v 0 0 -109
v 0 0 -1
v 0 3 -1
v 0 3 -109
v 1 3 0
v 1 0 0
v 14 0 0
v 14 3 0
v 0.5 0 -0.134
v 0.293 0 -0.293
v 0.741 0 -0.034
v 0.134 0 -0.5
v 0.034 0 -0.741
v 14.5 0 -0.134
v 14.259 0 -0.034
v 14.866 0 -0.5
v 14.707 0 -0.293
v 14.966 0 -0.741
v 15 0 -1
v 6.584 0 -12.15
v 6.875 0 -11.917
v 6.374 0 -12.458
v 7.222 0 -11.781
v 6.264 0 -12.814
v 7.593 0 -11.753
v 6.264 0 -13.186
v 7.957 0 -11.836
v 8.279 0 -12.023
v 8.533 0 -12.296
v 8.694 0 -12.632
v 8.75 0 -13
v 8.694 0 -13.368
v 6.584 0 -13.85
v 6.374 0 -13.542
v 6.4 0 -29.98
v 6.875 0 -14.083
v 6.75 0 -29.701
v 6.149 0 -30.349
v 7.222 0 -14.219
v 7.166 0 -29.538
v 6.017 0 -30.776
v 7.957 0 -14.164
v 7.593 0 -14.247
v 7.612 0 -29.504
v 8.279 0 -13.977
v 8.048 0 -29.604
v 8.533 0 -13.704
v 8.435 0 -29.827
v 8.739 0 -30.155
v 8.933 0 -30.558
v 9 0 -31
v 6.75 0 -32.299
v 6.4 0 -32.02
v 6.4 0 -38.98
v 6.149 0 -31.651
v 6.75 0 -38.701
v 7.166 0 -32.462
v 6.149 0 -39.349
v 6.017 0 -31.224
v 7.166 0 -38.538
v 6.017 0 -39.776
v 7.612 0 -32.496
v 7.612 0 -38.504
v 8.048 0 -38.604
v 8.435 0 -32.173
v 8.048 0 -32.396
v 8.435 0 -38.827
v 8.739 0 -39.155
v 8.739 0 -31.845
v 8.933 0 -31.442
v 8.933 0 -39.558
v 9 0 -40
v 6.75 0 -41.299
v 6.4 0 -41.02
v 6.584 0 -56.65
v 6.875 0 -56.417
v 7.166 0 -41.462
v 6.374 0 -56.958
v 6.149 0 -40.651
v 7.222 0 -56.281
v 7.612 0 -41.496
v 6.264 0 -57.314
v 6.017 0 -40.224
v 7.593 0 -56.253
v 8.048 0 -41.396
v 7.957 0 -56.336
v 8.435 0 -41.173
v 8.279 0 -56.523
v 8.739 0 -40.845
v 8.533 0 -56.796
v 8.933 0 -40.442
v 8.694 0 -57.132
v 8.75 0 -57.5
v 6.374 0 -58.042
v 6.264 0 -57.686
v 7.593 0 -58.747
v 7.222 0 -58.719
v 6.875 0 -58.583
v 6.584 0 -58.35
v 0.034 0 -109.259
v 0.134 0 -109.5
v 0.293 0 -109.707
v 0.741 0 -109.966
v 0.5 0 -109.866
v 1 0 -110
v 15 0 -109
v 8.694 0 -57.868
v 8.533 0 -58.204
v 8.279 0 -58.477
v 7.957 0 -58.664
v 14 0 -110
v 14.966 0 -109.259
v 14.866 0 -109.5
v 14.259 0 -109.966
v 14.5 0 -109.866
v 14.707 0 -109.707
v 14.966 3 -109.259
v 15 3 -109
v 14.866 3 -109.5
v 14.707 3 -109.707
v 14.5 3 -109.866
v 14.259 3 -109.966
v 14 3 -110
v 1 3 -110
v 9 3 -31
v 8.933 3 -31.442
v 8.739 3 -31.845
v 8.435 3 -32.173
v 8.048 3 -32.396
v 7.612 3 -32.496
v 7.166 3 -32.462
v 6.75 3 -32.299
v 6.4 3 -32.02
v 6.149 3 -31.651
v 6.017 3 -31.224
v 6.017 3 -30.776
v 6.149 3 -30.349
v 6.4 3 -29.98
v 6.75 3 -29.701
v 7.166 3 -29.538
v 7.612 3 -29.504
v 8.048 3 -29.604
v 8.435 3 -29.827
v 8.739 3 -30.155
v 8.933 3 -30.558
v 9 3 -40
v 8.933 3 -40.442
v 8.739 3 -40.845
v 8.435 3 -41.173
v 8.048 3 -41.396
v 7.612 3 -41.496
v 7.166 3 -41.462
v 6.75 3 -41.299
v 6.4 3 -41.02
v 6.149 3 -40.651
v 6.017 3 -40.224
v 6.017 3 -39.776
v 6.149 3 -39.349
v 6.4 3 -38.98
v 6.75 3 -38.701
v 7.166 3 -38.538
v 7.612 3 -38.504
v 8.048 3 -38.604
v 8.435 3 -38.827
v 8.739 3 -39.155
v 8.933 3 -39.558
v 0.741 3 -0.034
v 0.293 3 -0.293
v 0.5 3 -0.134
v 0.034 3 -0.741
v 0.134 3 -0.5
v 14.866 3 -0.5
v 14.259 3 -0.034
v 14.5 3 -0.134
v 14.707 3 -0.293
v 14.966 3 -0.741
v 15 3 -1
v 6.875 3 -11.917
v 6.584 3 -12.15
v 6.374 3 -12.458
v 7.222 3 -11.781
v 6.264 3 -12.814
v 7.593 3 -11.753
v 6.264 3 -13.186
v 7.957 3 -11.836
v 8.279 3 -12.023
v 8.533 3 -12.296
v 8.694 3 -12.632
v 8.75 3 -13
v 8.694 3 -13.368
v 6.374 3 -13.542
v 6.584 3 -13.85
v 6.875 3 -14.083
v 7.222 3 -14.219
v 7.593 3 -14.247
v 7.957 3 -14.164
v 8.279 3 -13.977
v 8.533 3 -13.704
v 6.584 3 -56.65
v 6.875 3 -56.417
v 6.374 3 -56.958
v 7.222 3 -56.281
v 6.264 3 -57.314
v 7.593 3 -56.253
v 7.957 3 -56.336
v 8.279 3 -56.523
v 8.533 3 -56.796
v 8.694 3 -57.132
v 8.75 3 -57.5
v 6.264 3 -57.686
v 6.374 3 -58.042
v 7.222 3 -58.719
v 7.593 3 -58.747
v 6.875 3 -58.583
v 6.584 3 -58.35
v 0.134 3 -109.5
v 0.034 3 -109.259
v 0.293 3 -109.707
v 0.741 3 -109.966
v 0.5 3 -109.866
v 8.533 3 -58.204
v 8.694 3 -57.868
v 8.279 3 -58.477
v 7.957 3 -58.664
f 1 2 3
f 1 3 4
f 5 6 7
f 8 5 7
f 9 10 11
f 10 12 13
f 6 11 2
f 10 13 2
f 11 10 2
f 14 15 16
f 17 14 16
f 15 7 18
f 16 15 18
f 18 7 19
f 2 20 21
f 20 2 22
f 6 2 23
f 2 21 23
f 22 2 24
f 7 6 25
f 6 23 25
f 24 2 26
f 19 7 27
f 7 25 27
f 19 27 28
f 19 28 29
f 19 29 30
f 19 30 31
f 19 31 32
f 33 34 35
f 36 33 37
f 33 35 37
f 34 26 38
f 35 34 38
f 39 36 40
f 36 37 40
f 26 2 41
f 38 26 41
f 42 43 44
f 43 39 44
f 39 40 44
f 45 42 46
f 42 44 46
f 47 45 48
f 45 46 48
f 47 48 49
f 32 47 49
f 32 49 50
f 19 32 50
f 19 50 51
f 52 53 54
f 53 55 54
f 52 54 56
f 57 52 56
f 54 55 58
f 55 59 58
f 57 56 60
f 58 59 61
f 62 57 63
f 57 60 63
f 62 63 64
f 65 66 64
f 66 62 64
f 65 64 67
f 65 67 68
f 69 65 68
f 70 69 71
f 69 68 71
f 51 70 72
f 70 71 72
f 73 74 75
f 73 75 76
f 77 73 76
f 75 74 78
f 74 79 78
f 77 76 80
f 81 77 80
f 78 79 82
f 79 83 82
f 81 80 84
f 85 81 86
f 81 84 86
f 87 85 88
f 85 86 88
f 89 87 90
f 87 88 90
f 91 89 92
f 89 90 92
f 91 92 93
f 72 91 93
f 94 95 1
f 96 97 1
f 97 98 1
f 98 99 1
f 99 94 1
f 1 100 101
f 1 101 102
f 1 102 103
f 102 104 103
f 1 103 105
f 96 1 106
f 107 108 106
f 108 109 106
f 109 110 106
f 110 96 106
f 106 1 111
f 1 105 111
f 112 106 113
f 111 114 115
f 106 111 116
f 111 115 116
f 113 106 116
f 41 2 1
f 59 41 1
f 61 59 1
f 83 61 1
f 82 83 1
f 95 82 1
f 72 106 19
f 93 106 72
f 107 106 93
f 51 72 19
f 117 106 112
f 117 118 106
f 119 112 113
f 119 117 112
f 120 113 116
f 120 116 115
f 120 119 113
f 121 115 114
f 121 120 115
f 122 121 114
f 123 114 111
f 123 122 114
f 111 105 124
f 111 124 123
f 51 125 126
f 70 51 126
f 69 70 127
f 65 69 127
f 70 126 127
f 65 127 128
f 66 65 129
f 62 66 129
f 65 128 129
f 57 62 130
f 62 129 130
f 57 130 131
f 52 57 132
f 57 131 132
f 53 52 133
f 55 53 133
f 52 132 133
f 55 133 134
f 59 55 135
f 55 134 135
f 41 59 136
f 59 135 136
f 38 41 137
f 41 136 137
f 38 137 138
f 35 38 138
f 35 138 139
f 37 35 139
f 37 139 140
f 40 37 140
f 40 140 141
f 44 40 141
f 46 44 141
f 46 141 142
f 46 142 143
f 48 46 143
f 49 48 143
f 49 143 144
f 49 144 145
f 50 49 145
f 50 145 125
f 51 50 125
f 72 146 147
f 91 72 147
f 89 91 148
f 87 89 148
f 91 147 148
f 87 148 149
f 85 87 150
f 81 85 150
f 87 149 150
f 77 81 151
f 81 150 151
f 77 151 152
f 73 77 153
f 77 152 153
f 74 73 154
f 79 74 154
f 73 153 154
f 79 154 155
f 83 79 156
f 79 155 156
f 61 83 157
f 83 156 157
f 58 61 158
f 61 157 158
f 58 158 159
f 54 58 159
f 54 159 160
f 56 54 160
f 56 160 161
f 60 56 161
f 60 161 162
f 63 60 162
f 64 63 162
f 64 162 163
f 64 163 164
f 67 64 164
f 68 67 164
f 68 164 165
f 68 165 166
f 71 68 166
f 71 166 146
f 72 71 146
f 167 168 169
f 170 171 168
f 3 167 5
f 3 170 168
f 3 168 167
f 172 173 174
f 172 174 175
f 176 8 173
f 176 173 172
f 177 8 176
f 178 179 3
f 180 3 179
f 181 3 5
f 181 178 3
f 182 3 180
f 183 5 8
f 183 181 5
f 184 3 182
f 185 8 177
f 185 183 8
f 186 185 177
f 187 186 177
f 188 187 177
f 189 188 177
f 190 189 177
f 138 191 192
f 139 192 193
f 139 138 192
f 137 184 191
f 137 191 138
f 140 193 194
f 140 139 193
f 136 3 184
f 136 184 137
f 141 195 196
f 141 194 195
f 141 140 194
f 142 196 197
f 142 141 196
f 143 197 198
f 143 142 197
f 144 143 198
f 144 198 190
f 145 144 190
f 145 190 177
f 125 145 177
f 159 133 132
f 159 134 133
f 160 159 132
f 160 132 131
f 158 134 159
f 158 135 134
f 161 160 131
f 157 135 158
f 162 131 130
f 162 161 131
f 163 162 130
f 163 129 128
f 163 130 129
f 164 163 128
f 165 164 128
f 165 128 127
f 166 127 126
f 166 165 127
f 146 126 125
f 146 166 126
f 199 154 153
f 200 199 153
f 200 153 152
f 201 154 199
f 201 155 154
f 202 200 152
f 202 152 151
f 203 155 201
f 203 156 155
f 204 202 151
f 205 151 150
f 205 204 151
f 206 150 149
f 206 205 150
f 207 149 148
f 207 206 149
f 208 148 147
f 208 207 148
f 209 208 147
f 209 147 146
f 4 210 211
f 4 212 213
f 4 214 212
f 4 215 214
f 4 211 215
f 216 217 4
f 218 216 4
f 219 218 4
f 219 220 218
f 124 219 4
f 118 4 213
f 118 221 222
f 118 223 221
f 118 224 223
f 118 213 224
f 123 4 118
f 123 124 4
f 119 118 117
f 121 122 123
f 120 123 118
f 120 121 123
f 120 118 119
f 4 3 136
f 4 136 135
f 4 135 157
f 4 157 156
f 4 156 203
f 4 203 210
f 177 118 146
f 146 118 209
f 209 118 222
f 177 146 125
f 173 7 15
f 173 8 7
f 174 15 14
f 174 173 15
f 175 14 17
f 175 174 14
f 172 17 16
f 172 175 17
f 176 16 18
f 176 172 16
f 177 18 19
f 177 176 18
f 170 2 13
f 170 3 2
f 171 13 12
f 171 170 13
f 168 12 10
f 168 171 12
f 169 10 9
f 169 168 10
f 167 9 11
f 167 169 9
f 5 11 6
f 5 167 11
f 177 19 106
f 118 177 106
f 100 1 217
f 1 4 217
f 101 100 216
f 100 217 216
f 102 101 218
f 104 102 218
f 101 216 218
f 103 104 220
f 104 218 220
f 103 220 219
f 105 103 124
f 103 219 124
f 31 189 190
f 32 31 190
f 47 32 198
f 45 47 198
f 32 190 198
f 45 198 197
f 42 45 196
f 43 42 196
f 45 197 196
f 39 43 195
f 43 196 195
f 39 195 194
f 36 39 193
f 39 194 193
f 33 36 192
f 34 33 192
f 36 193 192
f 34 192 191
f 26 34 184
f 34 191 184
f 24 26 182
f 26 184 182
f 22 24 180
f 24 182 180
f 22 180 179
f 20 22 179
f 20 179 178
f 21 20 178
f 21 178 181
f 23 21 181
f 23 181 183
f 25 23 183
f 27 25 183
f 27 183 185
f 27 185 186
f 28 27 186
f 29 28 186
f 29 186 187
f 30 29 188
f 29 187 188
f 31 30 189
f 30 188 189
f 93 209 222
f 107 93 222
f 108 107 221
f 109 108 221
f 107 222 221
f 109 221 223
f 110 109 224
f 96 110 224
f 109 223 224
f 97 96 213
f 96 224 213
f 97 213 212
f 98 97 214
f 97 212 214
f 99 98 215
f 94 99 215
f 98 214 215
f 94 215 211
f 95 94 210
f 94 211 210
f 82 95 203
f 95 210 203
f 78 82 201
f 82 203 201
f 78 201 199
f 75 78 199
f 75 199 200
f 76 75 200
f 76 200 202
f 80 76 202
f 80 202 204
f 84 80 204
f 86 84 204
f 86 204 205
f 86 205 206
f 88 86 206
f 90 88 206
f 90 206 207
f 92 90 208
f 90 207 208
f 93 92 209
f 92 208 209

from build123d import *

# Parameters (mm, degrees)
SKETCH_1_W          = 15
SKETCH_1_H          = 110
EXTRUDE_1_DEPTH     = 3
FILLET_1_R          = 1
SKETCH_2_R          = 1.25
CUT_EXTRUDE_1_DEPTH = 3
SKETCH_3_R          = 1.5
CUT_EXTRUDE_2_DEPTH = 10


with BuildPart() as part:
    # 草图1 → 凸台-拉伸1 (new body)
    with BuildSketch(Plane(origin=(0, 0, 0), x_dir=(1, 0, 0), z_dir=(0, 1, 0))):
        with Locations((7.5, 55)):
            Rectangle(SKETCH_1_W, SKETCH_1_H)
    extrude(amount=EXTRUDE_1_DEPTH)

    # 圆角1
    fillet_1_edges = [part.edges().sort_by_distance(p)[0] for p in [
        (0, 1.5, -110),
        (15, 1.5, -110),
        (15, 1.5, 0),
        (0, 1.5, 0),
    ]]
    fillet(fillet_1_edges, radius=FILLET_1_R)

    # 草图2 → 切除-拉伸1 (cut)
    with BuildSketch(Plane(origin=(0, 3, 0), x_dir=(1, 0, 0), z_dir=(0, 1, 0))):
        with Locations((7.5, 13)):
            Circle(SKETCH_2_R)
        with Locations((7.5, 57.5)):
            Circle(SKETCH_2_R)
    extrude(amount=-CUT_EXTRUDE_1_DEPTH, mode=Mode.SUBTRACT)

    # 草图3 → 切除-拉伸2 (cut)
    with BuildSketch(Plane(origin=(0, 3, 0), x_dir=(1, 0, 0), z_dir=(0, 1, 0))):
        with Locations((7.5, 40)):
            Circle(SKETCH_3_R)
        with Locations((7.5, 31)):
            Circle(SKETCH_3_R)
    extrude(amount=-CUT_EXTRUDE_2_DEPTH, mode=Mode.SUBTRACT)


solid = part.part
